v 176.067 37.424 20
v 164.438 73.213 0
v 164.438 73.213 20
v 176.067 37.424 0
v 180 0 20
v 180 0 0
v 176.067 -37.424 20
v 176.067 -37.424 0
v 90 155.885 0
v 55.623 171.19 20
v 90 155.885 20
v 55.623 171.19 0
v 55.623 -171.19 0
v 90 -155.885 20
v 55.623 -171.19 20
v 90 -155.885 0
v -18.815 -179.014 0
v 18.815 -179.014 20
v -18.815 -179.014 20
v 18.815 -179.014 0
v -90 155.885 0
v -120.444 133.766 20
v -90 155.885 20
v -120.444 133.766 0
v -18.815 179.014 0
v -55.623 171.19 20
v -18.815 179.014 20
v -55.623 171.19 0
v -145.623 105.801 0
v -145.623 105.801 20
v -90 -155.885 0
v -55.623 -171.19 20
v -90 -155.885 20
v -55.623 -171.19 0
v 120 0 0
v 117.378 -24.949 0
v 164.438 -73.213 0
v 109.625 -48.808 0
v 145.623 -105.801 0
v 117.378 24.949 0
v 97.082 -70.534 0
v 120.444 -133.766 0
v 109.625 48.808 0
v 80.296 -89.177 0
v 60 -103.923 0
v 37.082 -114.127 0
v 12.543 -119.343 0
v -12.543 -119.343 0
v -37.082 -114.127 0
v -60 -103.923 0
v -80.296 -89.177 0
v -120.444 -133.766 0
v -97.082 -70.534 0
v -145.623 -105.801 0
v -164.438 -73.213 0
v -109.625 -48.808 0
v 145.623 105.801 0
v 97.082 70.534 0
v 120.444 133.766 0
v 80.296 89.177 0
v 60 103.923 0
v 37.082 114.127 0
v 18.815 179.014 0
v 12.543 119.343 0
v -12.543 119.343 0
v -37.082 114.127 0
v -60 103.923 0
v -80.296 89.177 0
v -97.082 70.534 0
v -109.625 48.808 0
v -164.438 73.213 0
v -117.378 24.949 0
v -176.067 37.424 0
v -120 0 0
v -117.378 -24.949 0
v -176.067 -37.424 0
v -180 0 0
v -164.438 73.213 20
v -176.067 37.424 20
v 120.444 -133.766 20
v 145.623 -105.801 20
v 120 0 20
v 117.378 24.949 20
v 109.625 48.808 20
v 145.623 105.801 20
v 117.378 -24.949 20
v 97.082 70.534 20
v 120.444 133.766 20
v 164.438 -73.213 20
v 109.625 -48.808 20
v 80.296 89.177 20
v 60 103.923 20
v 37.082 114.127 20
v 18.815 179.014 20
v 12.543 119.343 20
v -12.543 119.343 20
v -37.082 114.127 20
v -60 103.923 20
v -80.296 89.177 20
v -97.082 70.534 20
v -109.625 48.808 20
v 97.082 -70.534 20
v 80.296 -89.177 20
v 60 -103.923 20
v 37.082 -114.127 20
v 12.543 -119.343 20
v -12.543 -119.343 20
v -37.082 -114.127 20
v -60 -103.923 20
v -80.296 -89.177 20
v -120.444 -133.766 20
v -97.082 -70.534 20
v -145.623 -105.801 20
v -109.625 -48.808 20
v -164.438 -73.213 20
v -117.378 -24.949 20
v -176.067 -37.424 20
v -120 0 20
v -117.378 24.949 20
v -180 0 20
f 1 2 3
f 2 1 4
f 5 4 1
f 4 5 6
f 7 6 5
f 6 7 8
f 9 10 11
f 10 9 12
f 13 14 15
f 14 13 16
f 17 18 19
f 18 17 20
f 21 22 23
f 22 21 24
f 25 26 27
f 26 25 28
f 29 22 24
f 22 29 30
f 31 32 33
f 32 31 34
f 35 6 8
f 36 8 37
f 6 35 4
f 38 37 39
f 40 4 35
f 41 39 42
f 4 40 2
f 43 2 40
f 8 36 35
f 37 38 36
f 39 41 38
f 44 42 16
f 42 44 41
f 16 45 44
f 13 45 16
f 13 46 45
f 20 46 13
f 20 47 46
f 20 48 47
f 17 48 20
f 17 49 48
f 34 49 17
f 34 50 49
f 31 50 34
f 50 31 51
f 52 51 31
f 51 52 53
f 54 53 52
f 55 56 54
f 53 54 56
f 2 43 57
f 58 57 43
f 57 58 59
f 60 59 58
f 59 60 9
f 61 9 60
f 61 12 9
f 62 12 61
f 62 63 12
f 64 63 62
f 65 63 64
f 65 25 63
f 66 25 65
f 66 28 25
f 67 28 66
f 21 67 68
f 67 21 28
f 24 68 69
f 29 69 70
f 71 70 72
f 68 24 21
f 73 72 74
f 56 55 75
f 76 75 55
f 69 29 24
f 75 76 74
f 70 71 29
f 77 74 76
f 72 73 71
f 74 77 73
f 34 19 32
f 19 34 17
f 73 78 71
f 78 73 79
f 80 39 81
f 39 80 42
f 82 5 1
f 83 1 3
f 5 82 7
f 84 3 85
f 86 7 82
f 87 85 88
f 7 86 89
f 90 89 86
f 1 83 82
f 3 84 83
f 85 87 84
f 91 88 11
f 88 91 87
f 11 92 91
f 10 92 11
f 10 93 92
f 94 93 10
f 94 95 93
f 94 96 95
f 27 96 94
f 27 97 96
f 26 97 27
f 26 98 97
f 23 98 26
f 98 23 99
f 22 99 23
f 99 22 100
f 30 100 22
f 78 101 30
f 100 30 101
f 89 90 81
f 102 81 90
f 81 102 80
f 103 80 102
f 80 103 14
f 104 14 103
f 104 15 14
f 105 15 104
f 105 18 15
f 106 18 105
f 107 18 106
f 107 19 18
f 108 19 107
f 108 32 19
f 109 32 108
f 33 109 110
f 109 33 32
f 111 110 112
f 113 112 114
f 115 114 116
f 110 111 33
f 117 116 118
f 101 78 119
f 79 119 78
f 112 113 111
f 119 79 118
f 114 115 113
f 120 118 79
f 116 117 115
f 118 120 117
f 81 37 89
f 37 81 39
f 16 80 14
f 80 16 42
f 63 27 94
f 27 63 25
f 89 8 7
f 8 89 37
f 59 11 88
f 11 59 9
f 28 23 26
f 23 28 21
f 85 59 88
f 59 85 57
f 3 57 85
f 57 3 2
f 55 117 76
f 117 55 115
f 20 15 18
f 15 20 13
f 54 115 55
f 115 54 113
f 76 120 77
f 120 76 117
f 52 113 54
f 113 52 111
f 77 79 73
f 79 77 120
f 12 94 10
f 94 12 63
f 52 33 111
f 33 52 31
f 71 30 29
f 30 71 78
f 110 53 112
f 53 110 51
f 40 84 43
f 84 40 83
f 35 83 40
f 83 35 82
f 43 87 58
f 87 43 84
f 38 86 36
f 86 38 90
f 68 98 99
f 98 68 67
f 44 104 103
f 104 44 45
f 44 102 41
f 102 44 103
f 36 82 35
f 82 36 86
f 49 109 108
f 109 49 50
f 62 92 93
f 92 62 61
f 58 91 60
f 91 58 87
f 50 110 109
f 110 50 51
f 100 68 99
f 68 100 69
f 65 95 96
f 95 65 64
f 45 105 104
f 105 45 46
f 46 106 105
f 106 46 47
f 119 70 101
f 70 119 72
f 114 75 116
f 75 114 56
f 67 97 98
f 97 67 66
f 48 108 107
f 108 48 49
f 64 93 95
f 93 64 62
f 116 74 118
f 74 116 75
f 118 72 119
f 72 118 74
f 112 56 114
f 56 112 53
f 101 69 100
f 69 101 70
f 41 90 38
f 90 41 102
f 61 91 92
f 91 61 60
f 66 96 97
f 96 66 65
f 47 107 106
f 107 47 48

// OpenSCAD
dia_in = 120;
dia_out = 180;
hieght = 20;

module wheel() {
	difference(){
		cylinder(r=dia_out,h=hieght);
		translate([0,0,-1])
		cylinder(r=dia_in,h=hieght+2);
	}
}
wheel();
